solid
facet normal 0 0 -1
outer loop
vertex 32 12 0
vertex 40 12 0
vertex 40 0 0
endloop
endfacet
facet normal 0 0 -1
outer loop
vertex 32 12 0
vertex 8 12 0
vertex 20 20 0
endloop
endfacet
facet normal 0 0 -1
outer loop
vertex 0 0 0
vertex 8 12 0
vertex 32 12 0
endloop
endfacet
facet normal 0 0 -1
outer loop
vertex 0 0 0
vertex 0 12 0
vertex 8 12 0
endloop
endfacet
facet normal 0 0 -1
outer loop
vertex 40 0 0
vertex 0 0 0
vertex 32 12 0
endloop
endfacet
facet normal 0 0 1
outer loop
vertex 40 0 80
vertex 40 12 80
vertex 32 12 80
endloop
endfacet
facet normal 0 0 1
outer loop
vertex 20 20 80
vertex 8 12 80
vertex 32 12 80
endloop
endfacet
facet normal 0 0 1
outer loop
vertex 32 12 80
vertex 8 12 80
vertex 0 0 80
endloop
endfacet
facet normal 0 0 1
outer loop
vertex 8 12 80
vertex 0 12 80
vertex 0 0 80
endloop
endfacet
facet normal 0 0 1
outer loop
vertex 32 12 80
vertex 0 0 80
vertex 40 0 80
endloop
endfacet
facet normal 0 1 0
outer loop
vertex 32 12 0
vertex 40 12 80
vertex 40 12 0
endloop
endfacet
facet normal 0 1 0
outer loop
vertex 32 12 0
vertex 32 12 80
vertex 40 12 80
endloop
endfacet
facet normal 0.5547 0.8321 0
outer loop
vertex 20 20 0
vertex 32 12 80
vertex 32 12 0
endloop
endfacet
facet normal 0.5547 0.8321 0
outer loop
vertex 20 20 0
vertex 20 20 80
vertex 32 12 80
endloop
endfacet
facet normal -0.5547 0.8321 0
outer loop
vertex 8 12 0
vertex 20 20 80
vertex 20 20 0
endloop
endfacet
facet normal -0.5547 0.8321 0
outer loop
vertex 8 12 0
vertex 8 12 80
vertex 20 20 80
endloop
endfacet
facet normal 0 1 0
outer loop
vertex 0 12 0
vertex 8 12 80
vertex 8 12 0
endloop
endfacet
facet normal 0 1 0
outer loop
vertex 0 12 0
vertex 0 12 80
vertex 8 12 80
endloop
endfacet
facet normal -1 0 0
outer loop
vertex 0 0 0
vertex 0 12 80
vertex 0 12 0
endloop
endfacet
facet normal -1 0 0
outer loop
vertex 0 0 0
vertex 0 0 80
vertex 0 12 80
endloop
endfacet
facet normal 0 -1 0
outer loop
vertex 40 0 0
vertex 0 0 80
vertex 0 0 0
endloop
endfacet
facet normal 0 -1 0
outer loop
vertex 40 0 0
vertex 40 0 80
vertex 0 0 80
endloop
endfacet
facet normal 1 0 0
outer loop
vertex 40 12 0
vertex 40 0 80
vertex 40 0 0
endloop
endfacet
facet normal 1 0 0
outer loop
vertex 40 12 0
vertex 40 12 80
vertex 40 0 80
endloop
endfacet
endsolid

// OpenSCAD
$fn = 32;

// ----------------------------------------------------------------------
// V guide rail: vrib, 40 mm wide
// ----------------------------------------------------------------------

// --- parameters (mm) ---
rail_w = 40;              // rail width, X
base_t = 12;              // base plate thickness
v_depth = 8;              // V feature depth / height
v_half_w = 12;            // half width of the V at the base face
plate_t = 80;             // rail length, Z (the extrusion height)
fit_tol = 0.1;            // declared fit tolerance (prompt contract)
free_tol = 0.5;           // declared free tolerance (prompt contract)

profile = [[0, 0], [40, 0], [40, 12], [32, 12], [20, 20], [8, 12], [0, 12]];  // primary outline, 7 points, counter clockwise

// --- the one profile operation ---
linear_extrude(height = plate_t) polygon(points = profile);
